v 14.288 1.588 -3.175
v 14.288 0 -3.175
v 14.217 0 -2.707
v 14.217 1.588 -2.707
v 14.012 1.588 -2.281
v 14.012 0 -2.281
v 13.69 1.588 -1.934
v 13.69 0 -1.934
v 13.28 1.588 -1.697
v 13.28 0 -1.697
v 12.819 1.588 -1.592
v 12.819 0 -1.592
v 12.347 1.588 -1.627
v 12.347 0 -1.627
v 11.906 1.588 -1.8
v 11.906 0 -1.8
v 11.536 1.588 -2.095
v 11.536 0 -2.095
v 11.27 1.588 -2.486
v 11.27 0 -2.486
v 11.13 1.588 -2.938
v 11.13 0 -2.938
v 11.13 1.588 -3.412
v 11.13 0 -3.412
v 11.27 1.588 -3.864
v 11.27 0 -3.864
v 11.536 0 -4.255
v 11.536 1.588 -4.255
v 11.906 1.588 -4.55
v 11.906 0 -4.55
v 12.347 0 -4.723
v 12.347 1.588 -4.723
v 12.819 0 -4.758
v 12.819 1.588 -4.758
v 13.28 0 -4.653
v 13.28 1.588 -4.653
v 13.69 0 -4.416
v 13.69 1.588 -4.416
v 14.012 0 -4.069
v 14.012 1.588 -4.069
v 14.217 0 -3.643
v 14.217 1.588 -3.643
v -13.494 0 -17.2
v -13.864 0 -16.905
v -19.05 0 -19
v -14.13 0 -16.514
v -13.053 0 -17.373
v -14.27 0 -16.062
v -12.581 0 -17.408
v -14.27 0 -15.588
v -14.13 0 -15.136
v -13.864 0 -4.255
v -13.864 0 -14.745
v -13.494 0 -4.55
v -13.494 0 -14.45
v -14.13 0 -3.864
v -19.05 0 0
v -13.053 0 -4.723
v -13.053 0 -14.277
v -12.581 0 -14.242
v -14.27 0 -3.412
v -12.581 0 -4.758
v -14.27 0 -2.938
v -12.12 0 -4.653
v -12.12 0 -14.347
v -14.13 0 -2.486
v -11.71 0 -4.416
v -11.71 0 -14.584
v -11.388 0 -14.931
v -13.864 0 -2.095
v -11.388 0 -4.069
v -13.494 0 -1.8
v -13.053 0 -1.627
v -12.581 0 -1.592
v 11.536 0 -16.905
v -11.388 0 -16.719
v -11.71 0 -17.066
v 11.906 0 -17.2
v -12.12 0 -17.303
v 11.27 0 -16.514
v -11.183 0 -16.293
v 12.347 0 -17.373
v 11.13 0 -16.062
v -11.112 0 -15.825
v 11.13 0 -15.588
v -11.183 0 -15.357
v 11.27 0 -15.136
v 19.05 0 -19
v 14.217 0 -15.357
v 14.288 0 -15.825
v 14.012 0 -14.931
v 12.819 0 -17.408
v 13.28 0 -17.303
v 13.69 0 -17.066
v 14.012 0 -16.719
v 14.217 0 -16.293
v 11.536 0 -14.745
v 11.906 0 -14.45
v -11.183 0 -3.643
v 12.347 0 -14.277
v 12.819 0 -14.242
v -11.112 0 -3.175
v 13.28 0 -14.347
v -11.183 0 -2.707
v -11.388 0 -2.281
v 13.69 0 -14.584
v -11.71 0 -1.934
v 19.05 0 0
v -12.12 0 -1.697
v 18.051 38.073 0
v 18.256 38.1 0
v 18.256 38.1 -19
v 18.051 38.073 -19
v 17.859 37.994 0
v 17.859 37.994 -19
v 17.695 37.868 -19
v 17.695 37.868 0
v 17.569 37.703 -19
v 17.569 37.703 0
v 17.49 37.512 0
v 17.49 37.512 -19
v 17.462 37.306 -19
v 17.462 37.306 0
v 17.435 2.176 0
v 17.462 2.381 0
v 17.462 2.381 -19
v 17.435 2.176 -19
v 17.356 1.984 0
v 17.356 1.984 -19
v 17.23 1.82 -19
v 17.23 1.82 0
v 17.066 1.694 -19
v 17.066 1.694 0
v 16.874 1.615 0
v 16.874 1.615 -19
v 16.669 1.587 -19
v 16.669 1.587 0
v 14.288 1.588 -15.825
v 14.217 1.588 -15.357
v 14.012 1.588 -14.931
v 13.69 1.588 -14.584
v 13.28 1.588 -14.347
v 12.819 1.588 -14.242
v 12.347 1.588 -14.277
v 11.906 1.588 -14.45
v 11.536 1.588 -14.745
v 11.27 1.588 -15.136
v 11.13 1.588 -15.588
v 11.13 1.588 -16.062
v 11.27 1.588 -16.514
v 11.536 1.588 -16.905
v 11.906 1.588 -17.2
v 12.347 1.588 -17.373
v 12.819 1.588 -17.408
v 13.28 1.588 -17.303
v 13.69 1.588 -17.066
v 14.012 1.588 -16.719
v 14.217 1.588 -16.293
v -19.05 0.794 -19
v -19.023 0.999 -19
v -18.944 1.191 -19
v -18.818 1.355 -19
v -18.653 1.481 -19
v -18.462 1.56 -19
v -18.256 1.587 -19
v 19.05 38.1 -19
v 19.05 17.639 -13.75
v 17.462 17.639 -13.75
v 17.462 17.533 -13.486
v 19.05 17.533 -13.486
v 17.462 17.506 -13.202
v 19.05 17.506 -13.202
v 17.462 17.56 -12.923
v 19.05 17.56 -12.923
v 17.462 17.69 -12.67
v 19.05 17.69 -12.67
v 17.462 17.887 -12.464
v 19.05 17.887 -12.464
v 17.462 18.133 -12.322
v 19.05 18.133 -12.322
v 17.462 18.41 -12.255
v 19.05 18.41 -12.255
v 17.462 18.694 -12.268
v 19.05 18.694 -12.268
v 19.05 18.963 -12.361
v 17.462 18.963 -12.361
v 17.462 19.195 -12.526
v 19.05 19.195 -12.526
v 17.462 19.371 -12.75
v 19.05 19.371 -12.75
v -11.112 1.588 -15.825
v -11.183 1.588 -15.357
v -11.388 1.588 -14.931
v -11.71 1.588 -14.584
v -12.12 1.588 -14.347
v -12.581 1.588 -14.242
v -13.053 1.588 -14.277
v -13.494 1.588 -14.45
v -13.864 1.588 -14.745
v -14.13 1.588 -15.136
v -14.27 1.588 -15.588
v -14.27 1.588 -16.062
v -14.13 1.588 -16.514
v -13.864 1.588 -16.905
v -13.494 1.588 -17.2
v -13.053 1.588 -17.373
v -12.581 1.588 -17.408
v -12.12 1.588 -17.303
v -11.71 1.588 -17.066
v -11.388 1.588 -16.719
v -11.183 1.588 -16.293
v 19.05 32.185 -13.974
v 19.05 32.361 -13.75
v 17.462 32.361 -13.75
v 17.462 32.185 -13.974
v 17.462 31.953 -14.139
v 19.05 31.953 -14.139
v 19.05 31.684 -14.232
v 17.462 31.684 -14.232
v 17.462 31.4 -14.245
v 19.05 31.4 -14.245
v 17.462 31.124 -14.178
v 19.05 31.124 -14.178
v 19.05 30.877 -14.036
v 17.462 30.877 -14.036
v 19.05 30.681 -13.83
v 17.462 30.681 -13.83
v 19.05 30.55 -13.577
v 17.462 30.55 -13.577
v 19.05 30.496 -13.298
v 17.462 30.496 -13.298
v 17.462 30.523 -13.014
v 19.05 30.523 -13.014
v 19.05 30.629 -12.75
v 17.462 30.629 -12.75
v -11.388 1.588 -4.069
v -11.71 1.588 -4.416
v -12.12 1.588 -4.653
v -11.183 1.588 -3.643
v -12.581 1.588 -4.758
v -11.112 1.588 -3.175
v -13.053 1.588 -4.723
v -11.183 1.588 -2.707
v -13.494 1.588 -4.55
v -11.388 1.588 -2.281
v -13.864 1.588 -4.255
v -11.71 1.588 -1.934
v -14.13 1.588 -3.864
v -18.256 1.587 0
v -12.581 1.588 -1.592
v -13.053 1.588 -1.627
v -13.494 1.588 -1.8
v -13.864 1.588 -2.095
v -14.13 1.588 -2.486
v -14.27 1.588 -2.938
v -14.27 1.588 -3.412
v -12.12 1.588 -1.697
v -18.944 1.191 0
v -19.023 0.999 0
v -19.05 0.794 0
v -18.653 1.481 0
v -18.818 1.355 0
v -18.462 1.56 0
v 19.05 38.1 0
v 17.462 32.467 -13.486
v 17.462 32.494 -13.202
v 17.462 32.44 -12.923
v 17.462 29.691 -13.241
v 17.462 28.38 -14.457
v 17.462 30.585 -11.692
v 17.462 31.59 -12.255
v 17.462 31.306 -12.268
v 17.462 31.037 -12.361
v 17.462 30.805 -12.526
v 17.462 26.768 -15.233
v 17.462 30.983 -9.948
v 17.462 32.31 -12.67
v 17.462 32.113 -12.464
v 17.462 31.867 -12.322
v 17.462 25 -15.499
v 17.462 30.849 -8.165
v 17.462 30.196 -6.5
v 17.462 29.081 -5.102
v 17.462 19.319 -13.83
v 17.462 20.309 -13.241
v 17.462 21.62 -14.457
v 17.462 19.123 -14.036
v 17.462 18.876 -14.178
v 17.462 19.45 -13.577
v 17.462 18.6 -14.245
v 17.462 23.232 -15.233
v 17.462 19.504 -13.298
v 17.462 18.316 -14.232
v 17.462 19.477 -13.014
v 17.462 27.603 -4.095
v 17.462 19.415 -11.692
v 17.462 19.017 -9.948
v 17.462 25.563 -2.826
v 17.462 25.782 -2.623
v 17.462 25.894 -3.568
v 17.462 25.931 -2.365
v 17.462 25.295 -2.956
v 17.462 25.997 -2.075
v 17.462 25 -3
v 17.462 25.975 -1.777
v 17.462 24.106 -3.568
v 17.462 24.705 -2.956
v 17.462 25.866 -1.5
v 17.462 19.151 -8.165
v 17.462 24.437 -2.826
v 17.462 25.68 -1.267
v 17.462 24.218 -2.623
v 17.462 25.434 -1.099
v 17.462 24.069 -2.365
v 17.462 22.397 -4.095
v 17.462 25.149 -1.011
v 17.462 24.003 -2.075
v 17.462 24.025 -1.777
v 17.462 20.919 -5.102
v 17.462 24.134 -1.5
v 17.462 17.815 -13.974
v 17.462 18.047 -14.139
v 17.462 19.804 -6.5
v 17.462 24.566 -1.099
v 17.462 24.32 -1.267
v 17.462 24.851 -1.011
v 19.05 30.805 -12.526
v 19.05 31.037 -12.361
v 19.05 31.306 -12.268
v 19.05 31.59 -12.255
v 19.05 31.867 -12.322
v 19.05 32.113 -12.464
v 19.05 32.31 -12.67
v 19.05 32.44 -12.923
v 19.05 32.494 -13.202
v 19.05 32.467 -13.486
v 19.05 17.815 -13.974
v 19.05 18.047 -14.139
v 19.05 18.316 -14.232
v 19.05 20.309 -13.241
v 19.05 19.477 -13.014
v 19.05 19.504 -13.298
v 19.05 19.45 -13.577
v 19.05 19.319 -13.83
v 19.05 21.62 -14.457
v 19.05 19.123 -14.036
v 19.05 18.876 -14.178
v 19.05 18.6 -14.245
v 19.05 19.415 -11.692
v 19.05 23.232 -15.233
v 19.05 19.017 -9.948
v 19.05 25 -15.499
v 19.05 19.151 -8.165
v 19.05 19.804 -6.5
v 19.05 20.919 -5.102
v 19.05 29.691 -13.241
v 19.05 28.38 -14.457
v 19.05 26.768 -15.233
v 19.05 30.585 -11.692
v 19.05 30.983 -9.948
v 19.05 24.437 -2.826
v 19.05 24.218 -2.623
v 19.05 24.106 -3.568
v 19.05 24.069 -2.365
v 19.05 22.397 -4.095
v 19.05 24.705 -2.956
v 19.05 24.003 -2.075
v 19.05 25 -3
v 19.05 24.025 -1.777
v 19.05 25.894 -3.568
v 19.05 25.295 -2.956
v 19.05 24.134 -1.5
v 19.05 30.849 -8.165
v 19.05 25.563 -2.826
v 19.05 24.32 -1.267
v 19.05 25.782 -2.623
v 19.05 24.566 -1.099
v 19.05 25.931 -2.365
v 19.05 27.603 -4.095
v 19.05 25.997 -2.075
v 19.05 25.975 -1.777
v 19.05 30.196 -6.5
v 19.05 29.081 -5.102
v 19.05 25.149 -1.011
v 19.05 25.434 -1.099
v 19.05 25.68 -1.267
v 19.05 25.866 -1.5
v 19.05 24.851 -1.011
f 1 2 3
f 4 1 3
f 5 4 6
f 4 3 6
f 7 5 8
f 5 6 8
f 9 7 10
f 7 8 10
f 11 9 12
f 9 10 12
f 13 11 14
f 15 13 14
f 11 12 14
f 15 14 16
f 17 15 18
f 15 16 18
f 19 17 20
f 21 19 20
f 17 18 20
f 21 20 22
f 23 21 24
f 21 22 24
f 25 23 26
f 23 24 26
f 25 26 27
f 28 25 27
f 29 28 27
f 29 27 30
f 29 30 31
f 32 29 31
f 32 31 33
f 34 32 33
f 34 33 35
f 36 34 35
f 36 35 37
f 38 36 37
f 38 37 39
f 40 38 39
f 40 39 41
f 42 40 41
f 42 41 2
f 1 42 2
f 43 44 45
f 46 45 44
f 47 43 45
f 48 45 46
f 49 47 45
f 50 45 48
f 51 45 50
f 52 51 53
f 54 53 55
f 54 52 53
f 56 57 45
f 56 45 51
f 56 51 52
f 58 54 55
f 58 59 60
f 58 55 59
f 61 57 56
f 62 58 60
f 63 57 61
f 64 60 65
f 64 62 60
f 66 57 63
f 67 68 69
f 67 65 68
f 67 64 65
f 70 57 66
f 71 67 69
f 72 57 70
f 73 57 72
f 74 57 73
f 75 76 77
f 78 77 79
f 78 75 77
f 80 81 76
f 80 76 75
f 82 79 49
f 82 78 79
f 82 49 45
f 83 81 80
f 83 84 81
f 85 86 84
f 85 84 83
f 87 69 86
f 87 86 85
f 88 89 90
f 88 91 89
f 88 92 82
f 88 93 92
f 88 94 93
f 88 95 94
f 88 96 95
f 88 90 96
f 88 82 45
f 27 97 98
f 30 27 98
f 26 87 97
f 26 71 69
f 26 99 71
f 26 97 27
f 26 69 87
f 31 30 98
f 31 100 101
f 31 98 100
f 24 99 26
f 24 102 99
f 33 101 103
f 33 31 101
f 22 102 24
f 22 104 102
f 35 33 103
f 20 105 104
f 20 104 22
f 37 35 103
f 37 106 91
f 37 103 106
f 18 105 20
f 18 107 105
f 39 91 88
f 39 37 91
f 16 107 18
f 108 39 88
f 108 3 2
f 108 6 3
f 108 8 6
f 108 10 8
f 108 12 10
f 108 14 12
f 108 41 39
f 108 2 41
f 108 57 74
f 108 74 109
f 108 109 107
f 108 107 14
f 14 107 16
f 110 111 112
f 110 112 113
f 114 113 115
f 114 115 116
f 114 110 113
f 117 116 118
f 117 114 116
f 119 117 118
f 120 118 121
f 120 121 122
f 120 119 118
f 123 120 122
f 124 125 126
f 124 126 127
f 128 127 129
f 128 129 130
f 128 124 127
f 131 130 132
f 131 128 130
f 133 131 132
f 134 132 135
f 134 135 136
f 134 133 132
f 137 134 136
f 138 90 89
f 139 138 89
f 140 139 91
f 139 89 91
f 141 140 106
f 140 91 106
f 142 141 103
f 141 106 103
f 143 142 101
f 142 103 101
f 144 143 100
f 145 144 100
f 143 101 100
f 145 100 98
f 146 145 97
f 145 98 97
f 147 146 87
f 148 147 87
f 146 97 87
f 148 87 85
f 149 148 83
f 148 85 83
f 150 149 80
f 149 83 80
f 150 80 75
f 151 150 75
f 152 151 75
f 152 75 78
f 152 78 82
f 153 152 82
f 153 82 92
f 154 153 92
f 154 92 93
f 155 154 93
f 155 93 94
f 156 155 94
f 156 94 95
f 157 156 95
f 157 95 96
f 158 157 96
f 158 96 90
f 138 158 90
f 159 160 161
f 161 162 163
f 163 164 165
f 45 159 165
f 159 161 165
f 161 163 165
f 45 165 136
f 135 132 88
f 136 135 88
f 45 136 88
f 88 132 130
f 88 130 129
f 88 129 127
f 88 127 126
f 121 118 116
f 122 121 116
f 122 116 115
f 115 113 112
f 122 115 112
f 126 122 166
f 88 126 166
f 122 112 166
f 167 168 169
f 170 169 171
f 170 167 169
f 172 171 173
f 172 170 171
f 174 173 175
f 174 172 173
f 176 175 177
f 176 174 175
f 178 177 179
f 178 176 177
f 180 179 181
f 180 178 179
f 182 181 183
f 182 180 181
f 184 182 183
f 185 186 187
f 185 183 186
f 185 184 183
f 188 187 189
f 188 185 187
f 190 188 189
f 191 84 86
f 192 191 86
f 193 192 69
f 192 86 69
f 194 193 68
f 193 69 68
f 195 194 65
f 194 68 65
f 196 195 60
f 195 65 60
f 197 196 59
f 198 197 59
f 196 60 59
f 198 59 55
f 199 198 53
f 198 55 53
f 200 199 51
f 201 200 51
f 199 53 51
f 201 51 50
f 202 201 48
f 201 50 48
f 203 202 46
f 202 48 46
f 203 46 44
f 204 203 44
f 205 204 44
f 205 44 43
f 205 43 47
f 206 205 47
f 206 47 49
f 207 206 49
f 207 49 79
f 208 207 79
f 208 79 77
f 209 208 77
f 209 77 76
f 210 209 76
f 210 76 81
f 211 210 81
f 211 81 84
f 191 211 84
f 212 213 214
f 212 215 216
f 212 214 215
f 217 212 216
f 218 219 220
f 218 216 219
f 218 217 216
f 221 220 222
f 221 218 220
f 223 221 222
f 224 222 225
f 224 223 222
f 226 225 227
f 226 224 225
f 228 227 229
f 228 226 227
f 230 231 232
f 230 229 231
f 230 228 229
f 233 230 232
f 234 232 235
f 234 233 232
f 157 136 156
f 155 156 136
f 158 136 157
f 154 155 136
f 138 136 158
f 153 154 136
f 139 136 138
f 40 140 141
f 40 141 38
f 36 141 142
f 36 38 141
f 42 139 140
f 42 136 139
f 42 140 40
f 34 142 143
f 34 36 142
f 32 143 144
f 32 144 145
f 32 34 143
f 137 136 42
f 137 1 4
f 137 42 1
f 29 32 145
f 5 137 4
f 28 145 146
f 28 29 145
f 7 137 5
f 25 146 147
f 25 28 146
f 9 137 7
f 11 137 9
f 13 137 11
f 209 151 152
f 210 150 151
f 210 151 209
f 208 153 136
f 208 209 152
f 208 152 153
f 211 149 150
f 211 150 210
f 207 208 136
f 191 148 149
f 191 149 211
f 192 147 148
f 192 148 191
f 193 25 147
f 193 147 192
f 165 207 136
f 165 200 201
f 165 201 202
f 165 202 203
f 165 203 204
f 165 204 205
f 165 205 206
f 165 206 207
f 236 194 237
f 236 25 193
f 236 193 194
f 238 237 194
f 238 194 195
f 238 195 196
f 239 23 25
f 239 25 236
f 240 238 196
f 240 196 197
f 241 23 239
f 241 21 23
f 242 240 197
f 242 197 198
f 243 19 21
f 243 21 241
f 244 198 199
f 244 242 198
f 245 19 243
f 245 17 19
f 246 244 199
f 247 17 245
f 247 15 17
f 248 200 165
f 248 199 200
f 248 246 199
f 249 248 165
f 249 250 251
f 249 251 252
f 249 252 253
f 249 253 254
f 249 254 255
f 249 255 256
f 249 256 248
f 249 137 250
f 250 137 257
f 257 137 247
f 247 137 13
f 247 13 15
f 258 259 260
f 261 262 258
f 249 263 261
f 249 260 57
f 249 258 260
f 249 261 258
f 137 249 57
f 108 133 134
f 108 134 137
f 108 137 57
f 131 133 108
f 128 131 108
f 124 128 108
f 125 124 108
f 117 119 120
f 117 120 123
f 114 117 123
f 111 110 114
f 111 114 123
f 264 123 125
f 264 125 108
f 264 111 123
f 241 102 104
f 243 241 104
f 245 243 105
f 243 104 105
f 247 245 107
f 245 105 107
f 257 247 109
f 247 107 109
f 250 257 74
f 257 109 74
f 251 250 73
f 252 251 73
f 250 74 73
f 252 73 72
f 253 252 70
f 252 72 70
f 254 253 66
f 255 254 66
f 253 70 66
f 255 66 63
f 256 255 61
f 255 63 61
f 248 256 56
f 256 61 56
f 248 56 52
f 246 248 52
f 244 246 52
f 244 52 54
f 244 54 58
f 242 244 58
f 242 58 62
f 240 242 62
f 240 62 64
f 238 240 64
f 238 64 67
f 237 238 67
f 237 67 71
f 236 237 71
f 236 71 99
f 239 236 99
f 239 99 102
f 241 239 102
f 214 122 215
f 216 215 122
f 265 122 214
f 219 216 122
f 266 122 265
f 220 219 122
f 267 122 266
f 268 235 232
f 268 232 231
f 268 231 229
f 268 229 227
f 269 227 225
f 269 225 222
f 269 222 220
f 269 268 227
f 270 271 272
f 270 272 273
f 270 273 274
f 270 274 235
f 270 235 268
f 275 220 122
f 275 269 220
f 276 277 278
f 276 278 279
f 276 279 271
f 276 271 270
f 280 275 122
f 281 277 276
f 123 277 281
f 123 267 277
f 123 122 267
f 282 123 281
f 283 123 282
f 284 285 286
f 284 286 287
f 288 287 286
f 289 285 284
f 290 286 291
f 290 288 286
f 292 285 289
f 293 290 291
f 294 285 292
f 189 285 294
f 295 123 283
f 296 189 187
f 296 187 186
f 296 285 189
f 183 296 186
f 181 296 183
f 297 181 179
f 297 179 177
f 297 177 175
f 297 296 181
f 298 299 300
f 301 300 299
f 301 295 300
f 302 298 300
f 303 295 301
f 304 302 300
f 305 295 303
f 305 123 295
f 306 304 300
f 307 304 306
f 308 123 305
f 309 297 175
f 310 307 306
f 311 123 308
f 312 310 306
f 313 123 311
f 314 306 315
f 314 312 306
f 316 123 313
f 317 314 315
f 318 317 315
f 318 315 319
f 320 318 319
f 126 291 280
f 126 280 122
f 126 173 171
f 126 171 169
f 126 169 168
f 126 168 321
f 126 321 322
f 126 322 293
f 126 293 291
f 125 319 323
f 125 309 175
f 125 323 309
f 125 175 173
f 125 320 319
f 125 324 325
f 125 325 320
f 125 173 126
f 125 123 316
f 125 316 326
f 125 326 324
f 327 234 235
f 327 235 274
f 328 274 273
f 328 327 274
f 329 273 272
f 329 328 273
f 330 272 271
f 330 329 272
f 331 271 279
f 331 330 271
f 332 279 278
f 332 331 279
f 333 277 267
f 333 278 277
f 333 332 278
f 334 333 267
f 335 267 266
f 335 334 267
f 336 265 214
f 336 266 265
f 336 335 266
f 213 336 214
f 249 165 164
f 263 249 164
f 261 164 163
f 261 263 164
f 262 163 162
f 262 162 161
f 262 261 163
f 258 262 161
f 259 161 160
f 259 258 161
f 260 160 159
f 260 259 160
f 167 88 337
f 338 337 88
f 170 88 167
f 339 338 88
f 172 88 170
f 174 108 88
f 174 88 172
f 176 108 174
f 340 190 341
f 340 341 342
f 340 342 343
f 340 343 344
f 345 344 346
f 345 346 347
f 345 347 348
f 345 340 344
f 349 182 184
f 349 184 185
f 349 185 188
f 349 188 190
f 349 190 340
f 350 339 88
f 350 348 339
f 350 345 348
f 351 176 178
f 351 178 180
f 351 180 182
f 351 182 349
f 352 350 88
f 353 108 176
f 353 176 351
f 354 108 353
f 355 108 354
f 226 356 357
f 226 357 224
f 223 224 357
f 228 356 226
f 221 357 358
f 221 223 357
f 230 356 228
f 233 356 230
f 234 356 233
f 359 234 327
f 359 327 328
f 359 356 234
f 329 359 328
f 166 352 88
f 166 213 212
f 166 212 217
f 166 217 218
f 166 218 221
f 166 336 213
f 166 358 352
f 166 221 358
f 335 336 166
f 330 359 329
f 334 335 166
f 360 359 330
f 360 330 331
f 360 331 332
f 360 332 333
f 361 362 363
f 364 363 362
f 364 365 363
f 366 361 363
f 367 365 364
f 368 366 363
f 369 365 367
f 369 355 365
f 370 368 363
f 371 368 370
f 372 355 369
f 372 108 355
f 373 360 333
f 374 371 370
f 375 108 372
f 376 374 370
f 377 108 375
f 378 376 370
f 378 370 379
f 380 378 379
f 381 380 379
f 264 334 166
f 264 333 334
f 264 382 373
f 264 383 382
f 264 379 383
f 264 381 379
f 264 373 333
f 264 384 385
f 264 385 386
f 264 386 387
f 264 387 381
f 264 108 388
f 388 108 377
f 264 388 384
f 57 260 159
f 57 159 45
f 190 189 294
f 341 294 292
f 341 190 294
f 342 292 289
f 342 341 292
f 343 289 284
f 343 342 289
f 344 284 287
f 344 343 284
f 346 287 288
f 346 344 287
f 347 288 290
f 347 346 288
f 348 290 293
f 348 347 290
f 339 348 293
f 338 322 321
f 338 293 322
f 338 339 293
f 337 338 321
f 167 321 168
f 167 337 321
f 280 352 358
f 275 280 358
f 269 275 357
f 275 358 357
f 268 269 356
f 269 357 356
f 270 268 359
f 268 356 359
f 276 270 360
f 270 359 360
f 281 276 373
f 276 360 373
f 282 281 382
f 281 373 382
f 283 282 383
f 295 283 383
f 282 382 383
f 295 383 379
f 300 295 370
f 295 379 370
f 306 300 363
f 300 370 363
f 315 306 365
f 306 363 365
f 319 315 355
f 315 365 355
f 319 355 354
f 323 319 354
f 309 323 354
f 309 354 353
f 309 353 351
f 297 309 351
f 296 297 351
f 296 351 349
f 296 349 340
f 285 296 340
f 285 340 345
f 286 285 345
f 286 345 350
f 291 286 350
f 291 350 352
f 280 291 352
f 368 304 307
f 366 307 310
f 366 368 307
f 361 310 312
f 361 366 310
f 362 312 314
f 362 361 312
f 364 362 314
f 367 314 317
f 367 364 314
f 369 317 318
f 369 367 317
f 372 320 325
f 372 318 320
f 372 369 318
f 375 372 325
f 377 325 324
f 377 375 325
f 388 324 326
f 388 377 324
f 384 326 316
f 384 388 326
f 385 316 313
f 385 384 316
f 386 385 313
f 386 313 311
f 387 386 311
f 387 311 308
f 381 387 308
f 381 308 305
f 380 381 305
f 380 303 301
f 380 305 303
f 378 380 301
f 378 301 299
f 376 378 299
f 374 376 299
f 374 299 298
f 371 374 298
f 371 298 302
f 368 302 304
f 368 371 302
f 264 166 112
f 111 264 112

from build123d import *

# Parameters (mm, degrees)
BOSS_EXTRUDE1_DEPTH = 19
CUT_EXTRUDE1_REACH  = 40.1
SKETCH3_R           = 5.99948
CUT_EXTRUDE2_REACH  = 40.1
TOP_VIEW_R          = 1.5875


with BuildPart() as part:
    # Sketch2 → Boss-Extrude1 (new body)
    with BuildSketch(Plane.XY):
        with BuildLine():
            Line((-19.05, 0), (19.05, 0))
            Line((19.05, 0), (19.05, 38.1))
            Line((19.05, 38.1), (18.25625, 38.1))
            ThreePointArc((18.25625, 38.1), (17.694983992, 37.867516008), (17.4625, 37.30625))
            Line((17.4625, 37.30625), (17.4625, 2.38125))
            ThreePointArc((17.4625, 2.38125), (17.230016008, 1.819983992), (16.66875, 1.5875))
            Line((16.66875, 1.5875), (-18.25625, 1.5875))
            ThreePointArc((-18.25625, 1.5875), (-18.817516008, 1.355016008), (-19.05, 0.79375))
            Line((-19.05, 0.79375), (-19.05, 0))
        make_face()
    extrude(amount=-BOSS_EXTRUDE1_DEPTH)

    # Sketch3 → Cut-Extrude1 (cut, up to next)
    with BuildSketch(Plane(origin=(19.05, 0, 0), x_dir=(0, 0, -1), z_dir=(1, 0, 0)), mode=Mode.PRIVATE) as cut_extrude1_sk1:
        with Locations((9.5, 25)):
            Circle(SKETCH3_R)
    cut_extrude1_tool1 = extrude(cut_extrude1_sk1.sketch, amount=-CUT_EXTRUDE1_REACH, mode=Mode.PRIVATE) & part.part
    add(cut_extrude1_tool1.solids().sort_by_distance((19.05, 25, -9.5))[0], mode=Mode.SUBTRACT)
    # Sketch3 → Cut-Extrude1 (cut, up to next)
    with BuildSketch(Plane(origin=(19.05, 0, 0), x_dir=(0, 0, -1), z_dir=(1, 0, 0)), mode=Mode.PRIVATE) as cut_extrude1_sk2:
        with BuildLine():
            ThreePointArc((12.75, 30.629165125), (12.383974596, 31.995190528), (13.75, 32.361215932))
            ThreePointArc((13.75, 32.361215932), (14.116025404, 30.995190528), (12.75, 30.629165125))
        make_face()
    cut_extrude1_tool2 = extrude(cut_extrude1_sk2.sketch, amount=-CUT_EXTRUDE1_REACH, mode=Mode.PRIVATE) & part.part
    add(cut_extrude1_tool2.solids().sort_by_distance((19.05, 31.495191, -13.25))[0], mode=Mode.SUBTRACT)
    # Sketch3 → Cut-Extrude1 (cut, up to next)
    with BuildSketch(Plane(origin=(19.05, 0, 0), x_dir=(0, 0, -1), z_dir=(1, 0, 0)), mode=Mode.PRIVATE) as cut_extrude1_sk3:
        with BuildLine():
            ThreePointArc((12.75, 19.370834875), (14.116025404, 19.004809472), (13.75, 17.638784068))
            ThreePointArc((13.75, 17.638784068), (12.383974596, 18.004809472), (12.75, 19.370834875))
        make_face()
    cut_extrude1_tool3 = extrude(cut_extrude1_sk3.sketch, amount=-CUT_EXTRUDE1_REACH, mode=Mode.PRIVATE) & part.part
    add(cut_extrude1_tool3.solids().sort_by_distance((19.05, 18.504809, -13.25))[0], mode=Mode.SUBTRACT)
    # Sketch3 → Cut-Extrude1 (cut, up to next)
    with BuildSketch(Plane(origin=(19.05, 0, 0), x_dir=(0, 0, -1), z_dir=(1, 0, 0)), mode=Mode.PRIVATE) as cut_extrude1_sk4:
        with BuildLine():
            ThreePointArc((1, 25), (2, 26), (3, 25))
            ThreePointArc((3, 25), (2, 24), (1, 25))
        make_face()
    cut_extrude1_tool4 = extrude(cut_extrude1_sk4.sketch, amount=-CUT_EXTRUDE1_REACH, mode=Mode.PRIVATE) & part.part
    add(cut_extrude1_tool4.solids().sort_by_distance((19.05, 25, -2))[0], mode=Mode.SUBTRACT)

    # Top View → Cut-Extrude2 (cut, up to next)
    with BuildSketch(Plane.XZ, mode=Mode.PRIVATE) as cut_extrude2_sk1:
        with Locations((-12.7, -15.825)):
            Circle(TOP_VIEW_R)
    cut_extrude2_tool1 = extrude(cut_extrude2_sk1.sketch, amount=-CUT_EXTRUDE2_REACH, mode=Mode.PRIVATE) & part.part
    add(cut_extrude2_tool1.solids().sort_by_distance((-12.7, 0, -15.825))[0], mode=Mode.SUBTRACT)
    # Top View → Cut-Extrude2 (cut, up to next)
    with BuildSketch(Plane.XZ, mode=Mode.PRIVATE) as cut_extrude2_sk2:
        with Locations((12.7, -15.825)):
            Circle(TOP_VIEW_R)
    cut_extrude2_tool2 = extrude(cut_extrude2_sk2.sketch, amount=-CUT_EXTRUDE2_REACH, mode=Mode.PRIVATE) & part.part
    add(cut_extrude2_tool2.solids().sort_by_distance((12.7, 0, -15.825))[0], mode=Mode.SUBTRACT)
    # Top View → Cut-Extrude2 (cut, up to next)
    with BuildSketch(Plane.XZ, mode=Mode.PRIVATE) as cut_extrude2_sk3:
        with Locations((12.7, -3.175)):
            Circle(TOP_VIEW_R)
    cut_extrude2_tool3 = extrude(cut_extrude2_sk3.sketch, amount=-CUT_EXTRUDE2_REACH, mode=Mode.PRIVATE) & part.part
    add(cut_extrude2_tool3.solids().sort_by_distance((12.7, 0, -3.175))[0], mode=Mode.SUBTRACT)
    # Top View → Cut-Extrude2 (cut, up to next)
    with BuildSketch(Plane.XZ, mode=Mode.PRIVATE) as cut_extrude2_sk4:
        with Locations((-12.7, -3.175)):
            Circle(TOP_VIEW_R)
    cut_extrude2_tool4 = extrude(cut_extrude2_sk4.sketch, amount=-CUT_EXTRUDE2_REACH, mode=Mode.PRIVATE) & part.part
    add(cut_extrude2_tool4.solids().sort_by_distance((-12.7, 0, -3.175))[0], mode=Mode.SUBTRACT)


solid = part.part
